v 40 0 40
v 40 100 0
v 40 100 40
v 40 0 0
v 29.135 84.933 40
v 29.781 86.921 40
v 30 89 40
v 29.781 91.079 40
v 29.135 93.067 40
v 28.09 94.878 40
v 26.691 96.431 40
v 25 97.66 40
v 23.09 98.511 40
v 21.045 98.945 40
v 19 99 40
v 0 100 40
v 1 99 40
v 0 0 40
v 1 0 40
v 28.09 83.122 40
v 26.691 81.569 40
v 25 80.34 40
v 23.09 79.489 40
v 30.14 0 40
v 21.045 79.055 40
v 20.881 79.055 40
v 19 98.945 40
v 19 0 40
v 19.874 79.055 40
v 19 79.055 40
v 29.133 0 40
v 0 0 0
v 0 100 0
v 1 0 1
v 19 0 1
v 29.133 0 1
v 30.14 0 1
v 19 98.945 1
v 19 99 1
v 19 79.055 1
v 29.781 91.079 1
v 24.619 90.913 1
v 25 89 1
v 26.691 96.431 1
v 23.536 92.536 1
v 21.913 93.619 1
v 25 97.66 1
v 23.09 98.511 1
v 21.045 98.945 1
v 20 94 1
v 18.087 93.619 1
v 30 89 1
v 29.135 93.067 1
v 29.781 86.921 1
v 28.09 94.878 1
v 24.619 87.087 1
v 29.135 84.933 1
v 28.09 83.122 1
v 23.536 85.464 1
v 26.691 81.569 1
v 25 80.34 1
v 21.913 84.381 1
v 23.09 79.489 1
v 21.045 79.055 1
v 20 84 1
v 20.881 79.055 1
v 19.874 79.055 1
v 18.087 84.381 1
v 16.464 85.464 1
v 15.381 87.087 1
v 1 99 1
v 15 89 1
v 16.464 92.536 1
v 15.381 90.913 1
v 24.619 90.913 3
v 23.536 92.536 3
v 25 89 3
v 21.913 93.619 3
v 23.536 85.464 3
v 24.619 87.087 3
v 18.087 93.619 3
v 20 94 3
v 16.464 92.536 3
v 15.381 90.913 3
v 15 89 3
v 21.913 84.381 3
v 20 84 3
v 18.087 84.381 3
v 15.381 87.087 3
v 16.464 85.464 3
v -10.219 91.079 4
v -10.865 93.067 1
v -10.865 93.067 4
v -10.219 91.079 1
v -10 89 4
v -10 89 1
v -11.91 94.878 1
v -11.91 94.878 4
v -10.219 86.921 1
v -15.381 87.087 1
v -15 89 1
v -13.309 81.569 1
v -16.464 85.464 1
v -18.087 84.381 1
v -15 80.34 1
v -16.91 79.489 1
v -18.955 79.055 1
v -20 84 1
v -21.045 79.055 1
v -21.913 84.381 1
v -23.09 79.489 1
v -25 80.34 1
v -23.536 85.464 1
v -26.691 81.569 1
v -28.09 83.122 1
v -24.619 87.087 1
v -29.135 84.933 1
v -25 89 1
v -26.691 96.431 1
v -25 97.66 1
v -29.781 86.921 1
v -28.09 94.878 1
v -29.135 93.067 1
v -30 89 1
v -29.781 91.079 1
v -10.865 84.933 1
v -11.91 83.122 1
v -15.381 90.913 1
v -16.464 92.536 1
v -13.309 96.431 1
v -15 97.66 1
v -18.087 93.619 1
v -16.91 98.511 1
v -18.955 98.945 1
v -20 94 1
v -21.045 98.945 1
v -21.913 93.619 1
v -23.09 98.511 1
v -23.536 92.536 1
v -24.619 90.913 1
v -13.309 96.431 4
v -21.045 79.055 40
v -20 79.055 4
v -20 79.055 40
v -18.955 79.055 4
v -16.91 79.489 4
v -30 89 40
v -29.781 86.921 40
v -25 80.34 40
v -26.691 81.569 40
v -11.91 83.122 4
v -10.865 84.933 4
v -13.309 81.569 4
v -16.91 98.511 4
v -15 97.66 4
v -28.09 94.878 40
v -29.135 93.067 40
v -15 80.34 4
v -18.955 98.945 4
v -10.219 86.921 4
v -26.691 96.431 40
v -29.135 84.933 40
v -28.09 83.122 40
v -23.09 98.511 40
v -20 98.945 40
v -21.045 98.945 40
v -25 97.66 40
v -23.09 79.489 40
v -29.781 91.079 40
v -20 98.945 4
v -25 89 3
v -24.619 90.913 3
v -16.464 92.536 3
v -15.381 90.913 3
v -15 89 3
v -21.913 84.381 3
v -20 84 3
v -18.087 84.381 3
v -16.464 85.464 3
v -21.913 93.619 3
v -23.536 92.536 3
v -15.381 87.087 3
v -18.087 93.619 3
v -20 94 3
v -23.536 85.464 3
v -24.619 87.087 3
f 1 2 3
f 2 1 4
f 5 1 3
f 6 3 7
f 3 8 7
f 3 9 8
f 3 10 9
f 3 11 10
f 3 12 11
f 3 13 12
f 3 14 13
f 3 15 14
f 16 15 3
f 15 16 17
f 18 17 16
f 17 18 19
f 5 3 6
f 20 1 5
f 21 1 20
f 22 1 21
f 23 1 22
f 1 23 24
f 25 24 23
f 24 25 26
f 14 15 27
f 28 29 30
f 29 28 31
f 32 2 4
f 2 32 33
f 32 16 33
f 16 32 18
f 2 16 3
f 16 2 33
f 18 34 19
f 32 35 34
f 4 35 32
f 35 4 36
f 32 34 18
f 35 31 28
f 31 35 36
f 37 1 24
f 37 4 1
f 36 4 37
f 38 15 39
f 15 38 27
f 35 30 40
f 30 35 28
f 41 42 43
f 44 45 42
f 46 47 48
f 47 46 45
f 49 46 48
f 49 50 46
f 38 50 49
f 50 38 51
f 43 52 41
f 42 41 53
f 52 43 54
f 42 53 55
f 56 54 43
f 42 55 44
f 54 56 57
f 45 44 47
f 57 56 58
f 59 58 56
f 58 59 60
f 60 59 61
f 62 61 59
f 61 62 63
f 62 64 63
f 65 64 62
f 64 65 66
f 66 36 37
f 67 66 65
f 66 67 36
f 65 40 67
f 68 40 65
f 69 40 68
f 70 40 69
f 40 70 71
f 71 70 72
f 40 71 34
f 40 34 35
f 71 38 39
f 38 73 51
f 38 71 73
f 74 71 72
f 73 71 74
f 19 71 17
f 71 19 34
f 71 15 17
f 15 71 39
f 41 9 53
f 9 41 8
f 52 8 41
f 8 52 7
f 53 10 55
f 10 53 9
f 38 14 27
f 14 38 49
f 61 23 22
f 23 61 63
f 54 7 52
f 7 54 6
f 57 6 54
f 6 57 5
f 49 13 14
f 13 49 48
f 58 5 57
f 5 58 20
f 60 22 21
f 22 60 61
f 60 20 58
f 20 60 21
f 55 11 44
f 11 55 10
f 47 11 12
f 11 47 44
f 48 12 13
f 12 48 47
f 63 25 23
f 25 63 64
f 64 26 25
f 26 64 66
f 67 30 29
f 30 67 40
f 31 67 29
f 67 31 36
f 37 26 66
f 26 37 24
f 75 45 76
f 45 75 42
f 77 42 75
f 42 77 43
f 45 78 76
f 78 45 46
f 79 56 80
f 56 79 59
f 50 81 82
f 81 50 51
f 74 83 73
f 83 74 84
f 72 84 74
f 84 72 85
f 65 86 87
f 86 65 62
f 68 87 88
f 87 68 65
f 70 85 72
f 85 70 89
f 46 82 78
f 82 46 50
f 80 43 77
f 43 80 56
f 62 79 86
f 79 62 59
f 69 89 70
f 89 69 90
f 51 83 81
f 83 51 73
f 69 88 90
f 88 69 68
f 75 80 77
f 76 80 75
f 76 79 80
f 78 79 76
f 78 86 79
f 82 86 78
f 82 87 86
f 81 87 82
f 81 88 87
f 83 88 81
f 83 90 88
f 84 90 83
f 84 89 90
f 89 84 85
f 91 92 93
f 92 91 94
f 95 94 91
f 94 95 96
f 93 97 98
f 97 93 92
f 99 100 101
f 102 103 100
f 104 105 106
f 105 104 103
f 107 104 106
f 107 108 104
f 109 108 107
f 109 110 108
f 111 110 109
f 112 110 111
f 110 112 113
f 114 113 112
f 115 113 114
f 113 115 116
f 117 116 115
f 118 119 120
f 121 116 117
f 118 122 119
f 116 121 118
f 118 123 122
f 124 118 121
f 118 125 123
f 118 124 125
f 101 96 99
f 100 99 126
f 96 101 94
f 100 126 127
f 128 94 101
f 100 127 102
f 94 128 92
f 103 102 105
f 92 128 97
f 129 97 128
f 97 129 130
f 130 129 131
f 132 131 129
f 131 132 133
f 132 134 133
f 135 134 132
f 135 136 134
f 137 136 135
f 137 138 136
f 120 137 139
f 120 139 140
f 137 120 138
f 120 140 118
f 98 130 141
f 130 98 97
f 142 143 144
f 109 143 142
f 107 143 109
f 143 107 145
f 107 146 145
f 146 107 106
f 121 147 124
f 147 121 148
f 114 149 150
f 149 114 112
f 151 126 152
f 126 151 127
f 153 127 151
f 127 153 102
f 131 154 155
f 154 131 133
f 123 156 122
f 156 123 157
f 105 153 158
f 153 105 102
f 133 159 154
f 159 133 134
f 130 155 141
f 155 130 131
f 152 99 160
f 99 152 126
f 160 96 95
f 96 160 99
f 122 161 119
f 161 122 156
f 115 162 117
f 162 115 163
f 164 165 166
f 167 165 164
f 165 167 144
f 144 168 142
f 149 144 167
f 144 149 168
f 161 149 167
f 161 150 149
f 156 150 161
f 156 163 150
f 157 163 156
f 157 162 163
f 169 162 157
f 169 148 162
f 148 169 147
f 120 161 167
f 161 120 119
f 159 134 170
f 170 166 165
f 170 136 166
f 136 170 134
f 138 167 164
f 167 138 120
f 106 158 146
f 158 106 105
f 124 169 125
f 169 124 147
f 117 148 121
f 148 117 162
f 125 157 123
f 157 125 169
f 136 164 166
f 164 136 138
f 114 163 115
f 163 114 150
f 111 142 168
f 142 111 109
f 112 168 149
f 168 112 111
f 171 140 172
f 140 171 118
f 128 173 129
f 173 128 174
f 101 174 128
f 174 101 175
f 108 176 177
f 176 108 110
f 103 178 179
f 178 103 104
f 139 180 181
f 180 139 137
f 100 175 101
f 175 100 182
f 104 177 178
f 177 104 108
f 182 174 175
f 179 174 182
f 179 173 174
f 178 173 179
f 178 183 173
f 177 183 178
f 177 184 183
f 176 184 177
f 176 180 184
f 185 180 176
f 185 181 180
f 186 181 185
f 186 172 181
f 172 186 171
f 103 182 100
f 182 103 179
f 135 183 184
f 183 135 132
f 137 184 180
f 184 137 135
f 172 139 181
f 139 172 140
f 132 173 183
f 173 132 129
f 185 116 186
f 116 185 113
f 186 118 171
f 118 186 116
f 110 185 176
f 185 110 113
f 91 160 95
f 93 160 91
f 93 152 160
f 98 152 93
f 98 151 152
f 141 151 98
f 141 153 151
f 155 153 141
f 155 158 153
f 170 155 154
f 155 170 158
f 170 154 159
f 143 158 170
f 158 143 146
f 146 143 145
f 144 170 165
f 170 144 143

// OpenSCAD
seperation = 18.5; // Distance between the lense and the flash

depth = 100;
height = 40;
width = 40;

wall_thickness = 1;

refractor_diameter = 20;


lightpathangle = cos( (seperation/2) / sqrt(seperation*seperation + (depth - refractor_diameter/2 - wall_thickness)*(depth - refractor_diameter/2 - wall_thickness))); // This should be 6.68 I guess

union()
{
difference()
{
	cube (size=[width, depth, height]);
	translate([wall_thickness,0, wall_thickness]) cube (size=[width/2 -wall_thickness*2, depth-wall_thickness, height-wall_thickness]);
	translate([width/2, depth - wall_thickness - refractor_diameter/2, wall_thickness]) cylinder(r=refractor_diameter/2, h=height - wall_thickness);
	translate([ width/2 + seperation/2, -wall_thickness, wall_thickness]) rotate( a= [ 0, 0, 6.68], v=[0,0,0]) cube (size=[wall_thickness, depth, height]);


}
	translate([width/2, depth - wall_thickness - refractor_diameter/2, wall_thickness]) cylinder(r=refractor_diameter/4, h=wall_thickness * 2);

}


// The barrel
difference()
{
	translate([-width/2, depth - wall_thickness - refractor_diameter/2, wall_thickness]) cylinder(r=refractor_diameter/2, h=height - wall_thickness);
	translate([-width/2, depth - wall_thickness - refractor_diameter/2, wall_thickness]) cylinder(r=refractor_diameter/4, h=wall_thickness * 2);
	translate([-width/2, depth - wall_thickness - refractor_diameter, 4*wall_thickness]) cube (size=[width/2 , width/2 , height-wall_thickness]);

}
